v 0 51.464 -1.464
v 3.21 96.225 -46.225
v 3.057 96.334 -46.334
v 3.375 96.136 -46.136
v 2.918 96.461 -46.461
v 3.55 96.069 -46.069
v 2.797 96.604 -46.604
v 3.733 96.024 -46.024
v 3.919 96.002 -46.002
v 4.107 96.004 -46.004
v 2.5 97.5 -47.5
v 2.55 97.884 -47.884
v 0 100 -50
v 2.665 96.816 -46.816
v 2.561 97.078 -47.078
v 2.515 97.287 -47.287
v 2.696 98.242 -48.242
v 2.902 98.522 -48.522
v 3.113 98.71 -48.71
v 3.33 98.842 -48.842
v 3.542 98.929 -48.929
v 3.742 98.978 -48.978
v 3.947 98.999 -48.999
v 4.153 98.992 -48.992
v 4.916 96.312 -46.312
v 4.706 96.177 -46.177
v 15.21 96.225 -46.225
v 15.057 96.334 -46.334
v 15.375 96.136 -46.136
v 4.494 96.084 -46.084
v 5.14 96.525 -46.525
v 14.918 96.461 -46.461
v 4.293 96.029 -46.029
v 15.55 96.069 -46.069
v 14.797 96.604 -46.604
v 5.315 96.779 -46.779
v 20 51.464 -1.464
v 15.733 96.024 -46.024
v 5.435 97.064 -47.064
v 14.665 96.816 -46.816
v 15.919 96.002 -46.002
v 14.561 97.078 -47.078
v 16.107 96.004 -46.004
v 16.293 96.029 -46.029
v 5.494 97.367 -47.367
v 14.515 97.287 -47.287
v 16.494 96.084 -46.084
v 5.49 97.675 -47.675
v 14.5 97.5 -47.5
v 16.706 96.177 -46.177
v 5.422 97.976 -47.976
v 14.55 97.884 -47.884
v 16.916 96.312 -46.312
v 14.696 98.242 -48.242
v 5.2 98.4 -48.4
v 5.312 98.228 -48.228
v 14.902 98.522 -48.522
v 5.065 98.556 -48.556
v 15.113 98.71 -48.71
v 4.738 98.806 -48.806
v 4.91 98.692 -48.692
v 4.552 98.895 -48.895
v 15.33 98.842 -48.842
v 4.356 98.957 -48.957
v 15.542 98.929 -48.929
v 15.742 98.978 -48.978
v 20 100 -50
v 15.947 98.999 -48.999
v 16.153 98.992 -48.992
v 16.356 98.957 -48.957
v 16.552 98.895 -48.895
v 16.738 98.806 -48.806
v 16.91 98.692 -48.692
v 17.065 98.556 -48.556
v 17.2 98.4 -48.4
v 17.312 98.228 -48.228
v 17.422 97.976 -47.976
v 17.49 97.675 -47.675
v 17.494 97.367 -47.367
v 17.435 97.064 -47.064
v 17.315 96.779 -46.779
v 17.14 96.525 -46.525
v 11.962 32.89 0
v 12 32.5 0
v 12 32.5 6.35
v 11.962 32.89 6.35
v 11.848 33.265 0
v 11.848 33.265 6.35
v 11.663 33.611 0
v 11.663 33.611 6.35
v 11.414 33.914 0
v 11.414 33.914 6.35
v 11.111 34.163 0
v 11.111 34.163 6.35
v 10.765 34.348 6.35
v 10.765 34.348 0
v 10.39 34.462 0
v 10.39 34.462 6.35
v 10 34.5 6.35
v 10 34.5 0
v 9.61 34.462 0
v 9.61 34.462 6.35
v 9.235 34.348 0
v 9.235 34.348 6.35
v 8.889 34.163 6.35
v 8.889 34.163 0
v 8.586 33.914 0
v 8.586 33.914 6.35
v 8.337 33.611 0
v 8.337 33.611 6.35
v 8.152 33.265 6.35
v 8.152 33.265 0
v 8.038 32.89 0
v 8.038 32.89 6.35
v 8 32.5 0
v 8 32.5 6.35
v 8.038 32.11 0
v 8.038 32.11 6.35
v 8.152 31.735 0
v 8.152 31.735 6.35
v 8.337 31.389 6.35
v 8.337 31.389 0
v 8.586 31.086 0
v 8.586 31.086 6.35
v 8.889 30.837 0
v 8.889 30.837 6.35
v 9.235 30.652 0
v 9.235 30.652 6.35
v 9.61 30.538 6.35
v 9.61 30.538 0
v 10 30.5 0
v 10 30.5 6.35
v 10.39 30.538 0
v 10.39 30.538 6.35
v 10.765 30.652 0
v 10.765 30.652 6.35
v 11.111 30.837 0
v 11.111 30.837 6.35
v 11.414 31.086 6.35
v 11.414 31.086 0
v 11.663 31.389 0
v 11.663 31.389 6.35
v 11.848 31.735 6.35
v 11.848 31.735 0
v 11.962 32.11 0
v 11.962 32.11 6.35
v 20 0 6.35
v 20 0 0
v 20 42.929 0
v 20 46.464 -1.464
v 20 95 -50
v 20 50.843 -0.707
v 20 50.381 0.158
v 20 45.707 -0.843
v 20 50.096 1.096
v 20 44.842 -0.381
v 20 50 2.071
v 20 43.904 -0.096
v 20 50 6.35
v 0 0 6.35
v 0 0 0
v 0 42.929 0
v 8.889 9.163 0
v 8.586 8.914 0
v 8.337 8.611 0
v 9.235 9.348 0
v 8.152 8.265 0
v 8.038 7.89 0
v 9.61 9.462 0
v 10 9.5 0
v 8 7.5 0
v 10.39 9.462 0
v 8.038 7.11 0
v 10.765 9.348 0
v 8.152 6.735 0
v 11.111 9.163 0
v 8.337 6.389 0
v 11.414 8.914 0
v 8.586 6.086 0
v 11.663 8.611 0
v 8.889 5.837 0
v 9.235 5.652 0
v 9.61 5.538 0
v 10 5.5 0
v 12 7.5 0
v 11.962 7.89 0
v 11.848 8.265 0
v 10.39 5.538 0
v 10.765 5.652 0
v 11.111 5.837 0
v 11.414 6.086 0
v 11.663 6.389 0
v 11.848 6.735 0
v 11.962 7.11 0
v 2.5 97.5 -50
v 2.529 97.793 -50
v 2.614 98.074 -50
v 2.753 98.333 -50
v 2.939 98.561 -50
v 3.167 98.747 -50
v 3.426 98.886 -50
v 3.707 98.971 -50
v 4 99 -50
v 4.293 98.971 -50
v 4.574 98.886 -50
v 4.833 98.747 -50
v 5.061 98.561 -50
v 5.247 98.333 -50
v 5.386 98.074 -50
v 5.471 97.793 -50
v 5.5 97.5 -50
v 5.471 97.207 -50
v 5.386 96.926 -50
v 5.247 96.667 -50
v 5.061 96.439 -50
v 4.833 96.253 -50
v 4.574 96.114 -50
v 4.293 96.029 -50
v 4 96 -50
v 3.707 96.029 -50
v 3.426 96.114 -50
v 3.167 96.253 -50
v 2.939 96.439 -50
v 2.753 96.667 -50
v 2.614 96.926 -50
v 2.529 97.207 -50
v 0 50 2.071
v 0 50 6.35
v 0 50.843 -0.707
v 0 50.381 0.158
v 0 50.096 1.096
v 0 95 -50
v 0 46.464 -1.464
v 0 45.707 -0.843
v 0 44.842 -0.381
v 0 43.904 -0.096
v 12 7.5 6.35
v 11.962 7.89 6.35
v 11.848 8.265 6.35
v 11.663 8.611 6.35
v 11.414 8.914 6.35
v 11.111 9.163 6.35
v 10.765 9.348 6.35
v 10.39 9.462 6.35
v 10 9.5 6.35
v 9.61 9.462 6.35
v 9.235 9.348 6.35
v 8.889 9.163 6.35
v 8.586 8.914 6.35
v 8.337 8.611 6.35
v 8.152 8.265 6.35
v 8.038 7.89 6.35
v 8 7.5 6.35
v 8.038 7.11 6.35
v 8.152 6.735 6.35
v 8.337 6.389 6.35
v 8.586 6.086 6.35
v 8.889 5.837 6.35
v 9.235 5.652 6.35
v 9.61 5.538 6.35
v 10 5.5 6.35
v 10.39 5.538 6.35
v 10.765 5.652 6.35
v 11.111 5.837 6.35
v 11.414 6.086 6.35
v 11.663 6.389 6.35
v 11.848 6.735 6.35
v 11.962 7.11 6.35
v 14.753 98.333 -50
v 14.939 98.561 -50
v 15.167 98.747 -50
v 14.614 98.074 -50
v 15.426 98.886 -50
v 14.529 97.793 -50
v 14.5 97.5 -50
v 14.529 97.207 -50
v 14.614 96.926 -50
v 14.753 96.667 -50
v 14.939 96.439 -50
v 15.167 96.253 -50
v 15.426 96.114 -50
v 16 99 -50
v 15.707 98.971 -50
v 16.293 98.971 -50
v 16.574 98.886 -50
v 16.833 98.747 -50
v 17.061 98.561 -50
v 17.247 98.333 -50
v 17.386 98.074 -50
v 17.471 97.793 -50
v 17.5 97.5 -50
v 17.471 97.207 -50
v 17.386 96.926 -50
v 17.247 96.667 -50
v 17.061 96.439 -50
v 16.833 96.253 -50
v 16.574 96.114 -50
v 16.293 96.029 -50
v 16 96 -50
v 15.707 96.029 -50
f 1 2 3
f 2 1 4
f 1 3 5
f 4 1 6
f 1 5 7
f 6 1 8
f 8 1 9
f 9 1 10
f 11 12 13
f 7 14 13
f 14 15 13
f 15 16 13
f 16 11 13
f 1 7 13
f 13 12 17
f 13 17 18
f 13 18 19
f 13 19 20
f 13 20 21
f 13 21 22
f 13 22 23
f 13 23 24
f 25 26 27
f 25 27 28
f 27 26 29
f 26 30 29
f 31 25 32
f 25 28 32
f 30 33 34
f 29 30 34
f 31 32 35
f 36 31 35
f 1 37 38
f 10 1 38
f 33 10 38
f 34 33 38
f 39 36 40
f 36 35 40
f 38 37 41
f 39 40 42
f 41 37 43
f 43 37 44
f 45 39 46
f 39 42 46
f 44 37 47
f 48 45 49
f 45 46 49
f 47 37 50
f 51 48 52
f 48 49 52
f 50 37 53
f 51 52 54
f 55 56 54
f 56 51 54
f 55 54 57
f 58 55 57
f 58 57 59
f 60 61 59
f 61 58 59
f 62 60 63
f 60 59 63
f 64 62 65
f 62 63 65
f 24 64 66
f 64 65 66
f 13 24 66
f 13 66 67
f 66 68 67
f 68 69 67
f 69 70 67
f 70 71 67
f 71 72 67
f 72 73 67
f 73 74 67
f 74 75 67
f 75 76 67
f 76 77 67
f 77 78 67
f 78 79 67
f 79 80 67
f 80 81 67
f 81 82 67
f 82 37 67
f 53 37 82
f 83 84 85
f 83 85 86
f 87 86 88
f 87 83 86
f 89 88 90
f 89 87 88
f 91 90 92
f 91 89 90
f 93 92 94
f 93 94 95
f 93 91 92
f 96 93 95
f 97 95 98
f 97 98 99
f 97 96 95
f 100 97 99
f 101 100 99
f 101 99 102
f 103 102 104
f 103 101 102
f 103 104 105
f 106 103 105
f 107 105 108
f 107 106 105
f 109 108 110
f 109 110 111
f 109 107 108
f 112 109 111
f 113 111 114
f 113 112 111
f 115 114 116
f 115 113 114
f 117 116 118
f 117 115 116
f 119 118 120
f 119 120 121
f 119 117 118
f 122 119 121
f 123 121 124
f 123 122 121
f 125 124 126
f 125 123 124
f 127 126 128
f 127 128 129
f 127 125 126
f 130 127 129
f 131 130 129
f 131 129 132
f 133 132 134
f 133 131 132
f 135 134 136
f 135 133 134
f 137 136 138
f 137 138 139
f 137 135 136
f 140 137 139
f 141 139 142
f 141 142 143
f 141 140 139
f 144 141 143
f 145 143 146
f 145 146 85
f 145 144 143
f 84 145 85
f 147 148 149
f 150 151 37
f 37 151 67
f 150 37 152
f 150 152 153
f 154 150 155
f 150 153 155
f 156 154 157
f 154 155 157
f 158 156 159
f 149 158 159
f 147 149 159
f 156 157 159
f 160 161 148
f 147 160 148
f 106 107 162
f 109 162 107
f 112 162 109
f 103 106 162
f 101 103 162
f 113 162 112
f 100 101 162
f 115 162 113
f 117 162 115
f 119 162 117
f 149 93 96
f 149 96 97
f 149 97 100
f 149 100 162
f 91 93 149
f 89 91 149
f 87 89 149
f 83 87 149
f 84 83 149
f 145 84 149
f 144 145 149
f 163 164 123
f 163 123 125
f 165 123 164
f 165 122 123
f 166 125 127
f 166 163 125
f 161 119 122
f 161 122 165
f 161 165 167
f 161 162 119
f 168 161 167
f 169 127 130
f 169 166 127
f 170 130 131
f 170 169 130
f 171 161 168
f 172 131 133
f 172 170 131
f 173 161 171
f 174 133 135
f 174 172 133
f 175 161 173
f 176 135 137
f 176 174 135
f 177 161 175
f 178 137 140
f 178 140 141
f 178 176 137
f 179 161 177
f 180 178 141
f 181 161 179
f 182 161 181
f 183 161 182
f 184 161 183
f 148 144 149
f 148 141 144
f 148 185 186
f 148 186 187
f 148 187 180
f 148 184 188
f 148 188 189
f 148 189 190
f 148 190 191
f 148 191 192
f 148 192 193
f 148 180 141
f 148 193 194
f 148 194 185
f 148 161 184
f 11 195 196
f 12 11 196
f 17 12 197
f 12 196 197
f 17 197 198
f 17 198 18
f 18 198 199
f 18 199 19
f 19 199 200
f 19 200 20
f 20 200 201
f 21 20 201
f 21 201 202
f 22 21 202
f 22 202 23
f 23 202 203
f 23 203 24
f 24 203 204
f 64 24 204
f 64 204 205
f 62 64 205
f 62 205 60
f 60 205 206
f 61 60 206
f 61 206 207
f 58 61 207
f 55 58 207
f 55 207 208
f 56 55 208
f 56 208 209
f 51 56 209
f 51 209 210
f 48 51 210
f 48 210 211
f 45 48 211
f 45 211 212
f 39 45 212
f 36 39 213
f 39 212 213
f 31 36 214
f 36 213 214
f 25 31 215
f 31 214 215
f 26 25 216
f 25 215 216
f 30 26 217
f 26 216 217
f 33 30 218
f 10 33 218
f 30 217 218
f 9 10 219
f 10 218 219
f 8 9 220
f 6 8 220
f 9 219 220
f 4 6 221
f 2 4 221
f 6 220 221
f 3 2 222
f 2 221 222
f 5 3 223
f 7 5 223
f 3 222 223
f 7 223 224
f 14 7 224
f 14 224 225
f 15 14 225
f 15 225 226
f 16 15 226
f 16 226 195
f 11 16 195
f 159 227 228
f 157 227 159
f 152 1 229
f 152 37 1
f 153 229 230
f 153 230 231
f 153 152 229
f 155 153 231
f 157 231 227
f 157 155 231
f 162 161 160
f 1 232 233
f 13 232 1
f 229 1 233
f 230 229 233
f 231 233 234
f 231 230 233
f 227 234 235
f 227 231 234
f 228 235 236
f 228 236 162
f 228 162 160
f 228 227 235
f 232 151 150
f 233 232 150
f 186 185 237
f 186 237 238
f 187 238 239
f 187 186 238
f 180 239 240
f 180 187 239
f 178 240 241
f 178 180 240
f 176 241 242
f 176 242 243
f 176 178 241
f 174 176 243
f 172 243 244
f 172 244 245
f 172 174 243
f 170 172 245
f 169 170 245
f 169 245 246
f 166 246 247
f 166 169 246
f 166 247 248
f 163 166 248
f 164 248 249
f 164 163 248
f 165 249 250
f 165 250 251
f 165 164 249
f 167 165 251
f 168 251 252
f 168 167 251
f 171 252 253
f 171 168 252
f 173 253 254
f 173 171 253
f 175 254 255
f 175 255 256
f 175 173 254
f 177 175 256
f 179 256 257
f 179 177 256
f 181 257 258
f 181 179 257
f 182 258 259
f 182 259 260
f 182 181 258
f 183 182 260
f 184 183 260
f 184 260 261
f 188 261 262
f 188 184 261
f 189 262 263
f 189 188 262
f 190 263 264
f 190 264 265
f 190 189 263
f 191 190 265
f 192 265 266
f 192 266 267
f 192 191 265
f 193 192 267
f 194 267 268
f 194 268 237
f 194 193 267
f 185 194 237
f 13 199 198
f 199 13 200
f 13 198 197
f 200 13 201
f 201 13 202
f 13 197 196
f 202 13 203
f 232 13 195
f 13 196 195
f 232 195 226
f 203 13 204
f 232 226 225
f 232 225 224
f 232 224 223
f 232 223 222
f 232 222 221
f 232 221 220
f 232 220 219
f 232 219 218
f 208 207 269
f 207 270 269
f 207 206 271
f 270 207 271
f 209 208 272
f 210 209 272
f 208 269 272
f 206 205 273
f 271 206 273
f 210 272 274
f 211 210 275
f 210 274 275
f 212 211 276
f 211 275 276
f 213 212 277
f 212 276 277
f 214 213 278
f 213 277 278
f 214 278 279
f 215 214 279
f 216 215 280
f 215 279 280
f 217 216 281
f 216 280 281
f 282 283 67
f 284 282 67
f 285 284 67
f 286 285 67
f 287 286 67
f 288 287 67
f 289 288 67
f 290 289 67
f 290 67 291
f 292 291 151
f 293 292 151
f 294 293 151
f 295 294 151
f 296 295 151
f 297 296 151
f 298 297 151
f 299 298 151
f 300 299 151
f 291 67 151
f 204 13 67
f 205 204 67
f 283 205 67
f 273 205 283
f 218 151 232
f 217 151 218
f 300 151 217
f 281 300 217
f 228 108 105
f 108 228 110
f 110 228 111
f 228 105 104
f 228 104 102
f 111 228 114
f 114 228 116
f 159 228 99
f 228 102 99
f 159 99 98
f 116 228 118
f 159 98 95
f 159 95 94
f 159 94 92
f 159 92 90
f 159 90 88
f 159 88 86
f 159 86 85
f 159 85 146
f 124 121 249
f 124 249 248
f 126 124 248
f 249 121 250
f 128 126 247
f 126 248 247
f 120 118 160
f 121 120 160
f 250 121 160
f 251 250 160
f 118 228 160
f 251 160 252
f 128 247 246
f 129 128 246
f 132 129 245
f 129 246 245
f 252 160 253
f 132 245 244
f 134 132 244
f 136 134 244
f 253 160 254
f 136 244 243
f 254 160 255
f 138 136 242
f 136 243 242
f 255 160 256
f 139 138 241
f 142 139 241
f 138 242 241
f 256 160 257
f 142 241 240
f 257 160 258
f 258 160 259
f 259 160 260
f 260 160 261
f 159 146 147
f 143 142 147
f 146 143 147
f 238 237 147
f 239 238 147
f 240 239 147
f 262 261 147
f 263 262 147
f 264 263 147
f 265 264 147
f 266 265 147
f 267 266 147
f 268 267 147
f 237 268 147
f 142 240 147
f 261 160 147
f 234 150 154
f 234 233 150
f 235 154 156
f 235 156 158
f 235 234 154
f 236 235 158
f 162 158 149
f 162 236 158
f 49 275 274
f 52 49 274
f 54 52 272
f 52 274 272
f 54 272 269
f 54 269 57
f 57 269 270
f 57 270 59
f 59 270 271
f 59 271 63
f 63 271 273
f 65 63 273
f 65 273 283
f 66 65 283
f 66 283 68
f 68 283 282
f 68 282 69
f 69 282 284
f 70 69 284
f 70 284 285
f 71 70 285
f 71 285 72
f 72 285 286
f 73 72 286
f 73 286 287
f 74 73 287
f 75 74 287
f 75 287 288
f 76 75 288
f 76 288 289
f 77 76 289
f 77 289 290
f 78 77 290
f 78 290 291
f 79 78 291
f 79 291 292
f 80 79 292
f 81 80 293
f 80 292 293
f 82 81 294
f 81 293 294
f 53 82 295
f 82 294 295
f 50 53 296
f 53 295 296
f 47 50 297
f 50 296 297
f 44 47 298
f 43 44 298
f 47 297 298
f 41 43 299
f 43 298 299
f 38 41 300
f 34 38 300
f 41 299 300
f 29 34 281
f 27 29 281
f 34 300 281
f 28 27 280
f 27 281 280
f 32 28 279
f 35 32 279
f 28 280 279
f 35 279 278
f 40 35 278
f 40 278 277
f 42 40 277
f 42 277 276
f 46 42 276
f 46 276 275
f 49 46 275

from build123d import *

# Parameters (mm, degrees)
SKETCH1_W           = 20
SKETCH1_H           = 40
SKETCH1_R           = 2
BOSS_EXTRUDE1_DEPTH = 6.35
SKETCH2_W           = 20
SKETCH2_H           = 6.35
BOSS_EXTRUDE2_DEPTH = 10
BOSS_EXTRUDE3_DEPTH = 20
SKETCH4_R           = 1.5
CUT_EXTRUDE1_DEPTH  = 23.2
FILLET1_R           = 5


with BuildPart() as part:
    # Sketch1 → Boss-Extrude1 (new body)
    with BuildSketch(Plane.XY):
        with Locations((10, 20)):
            Rectangle(SKETCH1_W, SKETCH1_H)
        with Locations((10, 32.5)):
            Circle(SKETCH1_R, mode=Mode.SUBTRACT)
        with Locations((10, 7.5)):
            Circle(SKETCH1_R, mode=Mode.SUBTRACT)
    extrude(amount=BOSS_EXTRUDE1_DEPTH)

    # Sketch2 → Boss-Extrude2 (add)
    with BuildSketch(Plane(origin=(0, 40, 0), x_dir=(1, 0, 0), z_dir=(0, 1, 0))):
        with Locations((10, -3.175)):
            Rectangle(SKETCH2_W, SKETCH2_H)
    extrude(amount=BOSS_EXTRUDE2_DEPTH)

    # Sketch3 → Boss-Extrude3 (add)
    with BuildSketch(Plane(origin=(20, 0, 0), x_dir=(0, 0, -1), z_dir=(1, 0, 0))):
        Polygon((50, 100), (50, 95), (0, 45), (0, 50), align=None)
    extrude(amount=-BOSS_EXTRUDE3_DEPTH)

    # Sketch4 → Cut-Extrude1 (cut)
    with BuildSketch(Plane(origin=(0, 0, -50), x_dir=(-1, 0, 0), z_dir=(0, 0, -1))):
        with Locations((-16, 97.5)):
            Circle(SKETCH4_R)
        with Locations((-4, 97.5)):
            Circle(SKETCH4_R)
    extrude(amount=-CUT_EXTRUDE1_DEPTH, mode=Mode.SUBTRACT)

    # Fillet1
    fillet1_edges = [part.edges().sort_by_distance(p)[0] for p in [
        (10, 50, 0),
        (10, 45, 0),
    ]]
    fillet(fillet1_edges, radius=FILLET1_R)


solid = part.part
